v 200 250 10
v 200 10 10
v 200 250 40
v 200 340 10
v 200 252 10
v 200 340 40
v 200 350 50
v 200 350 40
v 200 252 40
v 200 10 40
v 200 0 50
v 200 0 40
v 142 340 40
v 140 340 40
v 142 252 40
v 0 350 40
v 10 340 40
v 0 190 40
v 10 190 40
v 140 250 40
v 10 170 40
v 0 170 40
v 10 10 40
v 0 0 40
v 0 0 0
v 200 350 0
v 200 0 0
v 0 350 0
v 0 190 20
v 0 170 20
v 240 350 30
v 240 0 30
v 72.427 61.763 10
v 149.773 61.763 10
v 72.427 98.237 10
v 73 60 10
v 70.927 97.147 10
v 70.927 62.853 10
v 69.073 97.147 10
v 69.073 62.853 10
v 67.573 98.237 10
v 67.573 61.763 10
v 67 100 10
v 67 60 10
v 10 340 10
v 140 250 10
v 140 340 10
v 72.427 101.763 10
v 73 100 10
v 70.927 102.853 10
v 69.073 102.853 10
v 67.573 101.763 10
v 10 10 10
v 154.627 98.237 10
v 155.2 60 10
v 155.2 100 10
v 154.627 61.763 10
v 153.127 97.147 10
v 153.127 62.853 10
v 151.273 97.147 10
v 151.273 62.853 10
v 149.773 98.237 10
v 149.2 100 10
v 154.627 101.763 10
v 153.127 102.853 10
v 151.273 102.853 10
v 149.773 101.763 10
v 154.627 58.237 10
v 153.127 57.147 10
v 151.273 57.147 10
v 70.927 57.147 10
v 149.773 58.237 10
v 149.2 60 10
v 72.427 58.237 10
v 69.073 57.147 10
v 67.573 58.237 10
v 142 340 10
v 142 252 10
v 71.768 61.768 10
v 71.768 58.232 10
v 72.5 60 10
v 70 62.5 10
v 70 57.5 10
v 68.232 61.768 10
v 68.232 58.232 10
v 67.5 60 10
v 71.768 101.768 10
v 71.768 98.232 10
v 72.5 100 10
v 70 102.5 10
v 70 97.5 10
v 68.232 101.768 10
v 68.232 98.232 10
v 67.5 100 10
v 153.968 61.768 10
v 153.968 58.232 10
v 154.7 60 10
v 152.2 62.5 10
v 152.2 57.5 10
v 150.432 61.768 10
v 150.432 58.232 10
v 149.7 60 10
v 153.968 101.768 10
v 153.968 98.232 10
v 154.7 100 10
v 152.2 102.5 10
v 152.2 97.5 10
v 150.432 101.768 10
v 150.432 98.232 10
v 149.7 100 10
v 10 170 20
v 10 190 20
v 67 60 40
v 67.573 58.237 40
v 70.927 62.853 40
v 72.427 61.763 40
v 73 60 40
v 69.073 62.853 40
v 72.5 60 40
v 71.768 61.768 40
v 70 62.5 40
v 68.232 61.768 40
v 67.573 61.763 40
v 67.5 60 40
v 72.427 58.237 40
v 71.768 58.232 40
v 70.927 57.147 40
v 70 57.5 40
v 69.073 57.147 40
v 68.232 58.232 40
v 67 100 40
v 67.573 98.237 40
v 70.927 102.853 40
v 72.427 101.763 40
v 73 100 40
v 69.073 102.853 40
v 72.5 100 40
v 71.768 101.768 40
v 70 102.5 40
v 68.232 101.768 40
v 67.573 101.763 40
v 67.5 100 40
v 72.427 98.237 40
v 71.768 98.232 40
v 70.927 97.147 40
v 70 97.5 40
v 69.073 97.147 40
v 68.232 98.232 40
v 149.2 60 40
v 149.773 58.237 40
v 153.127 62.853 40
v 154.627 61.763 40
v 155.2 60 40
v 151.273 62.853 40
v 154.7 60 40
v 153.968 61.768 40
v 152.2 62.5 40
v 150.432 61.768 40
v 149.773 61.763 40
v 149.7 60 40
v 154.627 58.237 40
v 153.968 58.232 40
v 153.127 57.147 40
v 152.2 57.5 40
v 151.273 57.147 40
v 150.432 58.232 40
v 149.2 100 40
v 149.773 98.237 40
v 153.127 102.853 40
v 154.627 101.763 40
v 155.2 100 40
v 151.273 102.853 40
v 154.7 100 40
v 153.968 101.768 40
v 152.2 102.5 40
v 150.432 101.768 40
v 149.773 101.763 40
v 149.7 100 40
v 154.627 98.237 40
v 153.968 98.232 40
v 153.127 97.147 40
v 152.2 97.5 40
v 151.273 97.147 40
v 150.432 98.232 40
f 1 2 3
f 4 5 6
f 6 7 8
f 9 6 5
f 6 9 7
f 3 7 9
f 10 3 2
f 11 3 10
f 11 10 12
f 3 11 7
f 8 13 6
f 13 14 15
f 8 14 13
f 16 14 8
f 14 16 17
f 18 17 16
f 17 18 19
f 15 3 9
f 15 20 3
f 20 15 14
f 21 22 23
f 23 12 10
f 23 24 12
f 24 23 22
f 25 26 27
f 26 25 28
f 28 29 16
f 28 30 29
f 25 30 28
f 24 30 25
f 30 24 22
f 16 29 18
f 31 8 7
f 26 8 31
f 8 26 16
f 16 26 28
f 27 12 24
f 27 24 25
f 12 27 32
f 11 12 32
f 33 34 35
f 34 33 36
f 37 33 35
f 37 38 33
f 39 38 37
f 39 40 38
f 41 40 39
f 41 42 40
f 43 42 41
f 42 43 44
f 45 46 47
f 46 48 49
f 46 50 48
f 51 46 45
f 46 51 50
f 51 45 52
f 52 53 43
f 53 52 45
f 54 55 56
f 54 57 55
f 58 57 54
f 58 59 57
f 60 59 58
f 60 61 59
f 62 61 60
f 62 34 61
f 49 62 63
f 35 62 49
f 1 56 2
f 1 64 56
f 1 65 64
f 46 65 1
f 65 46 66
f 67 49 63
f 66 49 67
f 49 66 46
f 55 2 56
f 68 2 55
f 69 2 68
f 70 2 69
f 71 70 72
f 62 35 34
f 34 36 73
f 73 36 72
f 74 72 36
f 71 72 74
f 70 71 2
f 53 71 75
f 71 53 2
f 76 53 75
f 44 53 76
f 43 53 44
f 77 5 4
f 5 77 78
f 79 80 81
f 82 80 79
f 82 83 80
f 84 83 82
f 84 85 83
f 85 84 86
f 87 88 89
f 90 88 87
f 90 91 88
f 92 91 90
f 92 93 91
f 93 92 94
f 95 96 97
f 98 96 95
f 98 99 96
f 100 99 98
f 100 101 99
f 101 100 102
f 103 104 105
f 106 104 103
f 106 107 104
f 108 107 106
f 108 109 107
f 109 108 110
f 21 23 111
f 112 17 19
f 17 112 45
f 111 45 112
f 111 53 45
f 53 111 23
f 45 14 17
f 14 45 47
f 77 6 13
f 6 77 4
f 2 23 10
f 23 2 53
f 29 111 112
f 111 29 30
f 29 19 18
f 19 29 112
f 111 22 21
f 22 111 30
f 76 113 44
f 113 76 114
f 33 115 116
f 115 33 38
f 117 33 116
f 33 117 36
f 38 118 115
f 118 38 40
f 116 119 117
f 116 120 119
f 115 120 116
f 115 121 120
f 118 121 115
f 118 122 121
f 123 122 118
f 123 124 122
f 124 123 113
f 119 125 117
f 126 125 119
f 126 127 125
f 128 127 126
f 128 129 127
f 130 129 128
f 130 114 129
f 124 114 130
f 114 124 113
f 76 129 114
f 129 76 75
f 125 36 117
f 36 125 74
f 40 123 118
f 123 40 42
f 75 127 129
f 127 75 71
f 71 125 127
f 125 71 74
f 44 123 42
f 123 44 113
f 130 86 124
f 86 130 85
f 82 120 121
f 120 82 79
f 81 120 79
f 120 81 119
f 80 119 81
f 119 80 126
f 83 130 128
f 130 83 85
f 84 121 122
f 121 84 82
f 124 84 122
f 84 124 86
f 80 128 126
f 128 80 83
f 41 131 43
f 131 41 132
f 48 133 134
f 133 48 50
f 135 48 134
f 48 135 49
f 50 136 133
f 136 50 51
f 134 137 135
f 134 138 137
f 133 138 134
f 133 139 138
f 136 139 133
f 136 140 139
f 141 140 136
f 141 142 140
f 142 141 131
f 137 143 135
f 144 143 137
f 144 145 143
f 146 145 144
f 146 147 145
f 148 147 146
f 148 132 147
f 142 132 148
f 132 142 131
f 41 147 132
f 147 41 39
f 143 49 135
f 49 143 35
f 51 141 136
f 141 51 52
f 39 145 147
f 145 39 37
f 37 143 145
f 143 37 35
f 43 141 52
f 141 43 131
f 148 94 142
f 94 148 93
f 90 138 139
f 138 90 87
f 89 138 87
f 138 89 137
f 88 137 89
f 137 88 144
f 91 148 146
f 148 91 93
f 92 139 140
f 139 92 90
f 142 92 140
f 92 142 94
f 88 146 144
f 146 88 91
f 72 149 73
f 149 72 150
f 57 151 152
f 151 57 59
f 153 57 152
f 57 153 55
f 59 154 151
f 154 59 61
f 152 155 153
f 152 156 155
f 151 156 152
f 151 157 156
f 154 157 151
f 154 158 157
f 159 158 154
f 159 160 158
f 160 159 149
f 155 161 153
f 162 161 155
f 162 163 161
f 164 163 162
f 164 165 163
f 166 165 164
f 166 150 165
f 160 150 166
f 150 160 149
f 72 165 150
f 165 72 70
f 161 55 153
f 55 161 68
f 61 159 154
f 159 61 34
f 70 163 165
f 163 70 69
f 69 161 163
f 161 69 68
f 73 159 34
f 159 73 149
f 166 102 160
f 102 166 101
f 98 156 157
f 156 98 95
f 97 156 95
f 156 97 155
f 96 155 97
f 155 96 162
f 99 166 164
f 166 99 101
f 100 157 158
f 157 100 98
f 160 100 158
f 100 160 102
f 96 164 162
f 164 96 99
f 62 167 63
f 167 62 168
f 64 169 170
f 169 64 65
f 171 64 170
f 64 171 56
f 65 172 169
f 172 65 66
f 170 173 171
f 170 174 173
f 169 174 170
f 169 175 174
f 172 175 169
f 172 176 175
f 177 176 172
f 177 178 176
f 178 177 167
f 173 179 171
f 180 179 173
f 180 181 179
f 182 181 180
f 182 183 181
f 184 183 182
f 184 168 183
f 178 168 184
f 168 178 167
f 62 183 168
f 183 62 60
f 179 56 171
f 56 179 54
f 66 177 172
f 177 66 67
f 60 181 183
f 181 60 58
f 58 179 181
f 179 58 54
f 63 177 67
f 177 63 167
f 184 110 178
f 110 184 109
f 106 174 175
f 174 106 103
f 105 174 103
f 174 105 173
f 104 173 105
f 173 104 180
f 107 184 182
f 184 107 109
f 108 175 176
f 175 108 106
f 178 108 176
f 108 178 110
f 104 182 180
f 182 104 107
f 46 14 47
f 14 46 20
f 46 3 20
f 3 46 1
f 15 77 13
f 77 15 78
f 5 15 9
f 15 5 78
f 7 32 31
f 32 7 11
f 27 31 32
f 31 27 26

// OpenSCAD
module prism(l, w, h) {
    polyhedron(// pt      0        1        2        3        4        5
               points=[[0,0,0], [0,w,h], [l,w,h], [l,0,0], [0,w,0], [l,w,0]],
               // top sloping face (A)
               faces=[[0,1,2,3],
               // vertical rectangular face (B)
               [2,1,4,5],
               // bottom face (C)
               [0,3,5,4],
               // rear triangular face (D)
               [0,4,1],
               // front triangular face (E)
               [3,2,5]]
      );
}

module standoff(r1, r2, h1) {
    difference() {
        cylinder(h=h1,r=r1);
        cylinder(h=h1, r= r2);
    }
}

module basepanelstorage() {
    difference() {
        cube([60, 100, 40]);
        translate([2, 2, 0])
            cube([58, 98, 40]);
    }
}

module joystickstandoffs() {
    standoff(3, 2.5, 40);
    translate([0, 40, 0])
        standoff(3, 2.5, 40);
    translate([82.2, 0, 0])
        standoff(3, 2.5, 40);
    translate([82.2, 40, 0])
        standoff(3, 2.5, 40);
}

module pcb1standoffs() {
    
}

module pcb2standoffs() {
}

// top panel of arcade stick
module toppanel() {
    difference() {
        translate([0, 0, 40])
            cube([200, 350, 10]);
        translate([110, 80, 20])
            cylinder(h=40, r=17.5);
        translate([90, 180, 20])
            cylinder(h=40, r=15);
        translate([70, 220, 20])
            cylinder(h=40, r=15);
        translate([70, 260, 20])
            cylinder(h=40, r=15);
        translate([70, 300, 20])
            cylinder(h=40, r=15);
        translate([130, 180, 20])
            cylinder(h=40, r=15);
        translate([110, 220, 20])
            cylinder(h=40, r=15);
        translate([110, 260, 20])
            cylinder(h=40, r=15);
        translate([110, 300, 20])
            cylinder(h=40, r=15);
        translate([170, 180, 20])
            cylinder(h=40, r=15);
        translate([150, 220, 20])
            cylinder(h=40, r=15);
        translate([30, 290, 20])
            cylinder(h=40, r=13);
        translate([30, 320, 20])
            cylinder(h=40, r=13);
        translate([10, 170, 20])
            cube([40, 60, 40]);
    }
}

// base panel of arcade stick
module basepanel() {
    // exterior
    difference() {
        cube([200, 350, 40]);
        translate([10, 10, 10])
            cube([210, 330, 45]);
        translate([-10, 170, 20])
            cube([40, 20, 20]);
    }
    rotate(90)
        translate([0, -240, 30])
            prism(350, 40, 20);
    rotate(90)
        translate([0, -240, 30])
            prism(350, 40, -30);
    
    // interior
    translate([70, 60, 0])
    joystickstandoffs();
    translate([140, 250, 0])
        basepanelstorage();
}

basepanel();

//translate([0, 0, 50])
//    toppanel();
